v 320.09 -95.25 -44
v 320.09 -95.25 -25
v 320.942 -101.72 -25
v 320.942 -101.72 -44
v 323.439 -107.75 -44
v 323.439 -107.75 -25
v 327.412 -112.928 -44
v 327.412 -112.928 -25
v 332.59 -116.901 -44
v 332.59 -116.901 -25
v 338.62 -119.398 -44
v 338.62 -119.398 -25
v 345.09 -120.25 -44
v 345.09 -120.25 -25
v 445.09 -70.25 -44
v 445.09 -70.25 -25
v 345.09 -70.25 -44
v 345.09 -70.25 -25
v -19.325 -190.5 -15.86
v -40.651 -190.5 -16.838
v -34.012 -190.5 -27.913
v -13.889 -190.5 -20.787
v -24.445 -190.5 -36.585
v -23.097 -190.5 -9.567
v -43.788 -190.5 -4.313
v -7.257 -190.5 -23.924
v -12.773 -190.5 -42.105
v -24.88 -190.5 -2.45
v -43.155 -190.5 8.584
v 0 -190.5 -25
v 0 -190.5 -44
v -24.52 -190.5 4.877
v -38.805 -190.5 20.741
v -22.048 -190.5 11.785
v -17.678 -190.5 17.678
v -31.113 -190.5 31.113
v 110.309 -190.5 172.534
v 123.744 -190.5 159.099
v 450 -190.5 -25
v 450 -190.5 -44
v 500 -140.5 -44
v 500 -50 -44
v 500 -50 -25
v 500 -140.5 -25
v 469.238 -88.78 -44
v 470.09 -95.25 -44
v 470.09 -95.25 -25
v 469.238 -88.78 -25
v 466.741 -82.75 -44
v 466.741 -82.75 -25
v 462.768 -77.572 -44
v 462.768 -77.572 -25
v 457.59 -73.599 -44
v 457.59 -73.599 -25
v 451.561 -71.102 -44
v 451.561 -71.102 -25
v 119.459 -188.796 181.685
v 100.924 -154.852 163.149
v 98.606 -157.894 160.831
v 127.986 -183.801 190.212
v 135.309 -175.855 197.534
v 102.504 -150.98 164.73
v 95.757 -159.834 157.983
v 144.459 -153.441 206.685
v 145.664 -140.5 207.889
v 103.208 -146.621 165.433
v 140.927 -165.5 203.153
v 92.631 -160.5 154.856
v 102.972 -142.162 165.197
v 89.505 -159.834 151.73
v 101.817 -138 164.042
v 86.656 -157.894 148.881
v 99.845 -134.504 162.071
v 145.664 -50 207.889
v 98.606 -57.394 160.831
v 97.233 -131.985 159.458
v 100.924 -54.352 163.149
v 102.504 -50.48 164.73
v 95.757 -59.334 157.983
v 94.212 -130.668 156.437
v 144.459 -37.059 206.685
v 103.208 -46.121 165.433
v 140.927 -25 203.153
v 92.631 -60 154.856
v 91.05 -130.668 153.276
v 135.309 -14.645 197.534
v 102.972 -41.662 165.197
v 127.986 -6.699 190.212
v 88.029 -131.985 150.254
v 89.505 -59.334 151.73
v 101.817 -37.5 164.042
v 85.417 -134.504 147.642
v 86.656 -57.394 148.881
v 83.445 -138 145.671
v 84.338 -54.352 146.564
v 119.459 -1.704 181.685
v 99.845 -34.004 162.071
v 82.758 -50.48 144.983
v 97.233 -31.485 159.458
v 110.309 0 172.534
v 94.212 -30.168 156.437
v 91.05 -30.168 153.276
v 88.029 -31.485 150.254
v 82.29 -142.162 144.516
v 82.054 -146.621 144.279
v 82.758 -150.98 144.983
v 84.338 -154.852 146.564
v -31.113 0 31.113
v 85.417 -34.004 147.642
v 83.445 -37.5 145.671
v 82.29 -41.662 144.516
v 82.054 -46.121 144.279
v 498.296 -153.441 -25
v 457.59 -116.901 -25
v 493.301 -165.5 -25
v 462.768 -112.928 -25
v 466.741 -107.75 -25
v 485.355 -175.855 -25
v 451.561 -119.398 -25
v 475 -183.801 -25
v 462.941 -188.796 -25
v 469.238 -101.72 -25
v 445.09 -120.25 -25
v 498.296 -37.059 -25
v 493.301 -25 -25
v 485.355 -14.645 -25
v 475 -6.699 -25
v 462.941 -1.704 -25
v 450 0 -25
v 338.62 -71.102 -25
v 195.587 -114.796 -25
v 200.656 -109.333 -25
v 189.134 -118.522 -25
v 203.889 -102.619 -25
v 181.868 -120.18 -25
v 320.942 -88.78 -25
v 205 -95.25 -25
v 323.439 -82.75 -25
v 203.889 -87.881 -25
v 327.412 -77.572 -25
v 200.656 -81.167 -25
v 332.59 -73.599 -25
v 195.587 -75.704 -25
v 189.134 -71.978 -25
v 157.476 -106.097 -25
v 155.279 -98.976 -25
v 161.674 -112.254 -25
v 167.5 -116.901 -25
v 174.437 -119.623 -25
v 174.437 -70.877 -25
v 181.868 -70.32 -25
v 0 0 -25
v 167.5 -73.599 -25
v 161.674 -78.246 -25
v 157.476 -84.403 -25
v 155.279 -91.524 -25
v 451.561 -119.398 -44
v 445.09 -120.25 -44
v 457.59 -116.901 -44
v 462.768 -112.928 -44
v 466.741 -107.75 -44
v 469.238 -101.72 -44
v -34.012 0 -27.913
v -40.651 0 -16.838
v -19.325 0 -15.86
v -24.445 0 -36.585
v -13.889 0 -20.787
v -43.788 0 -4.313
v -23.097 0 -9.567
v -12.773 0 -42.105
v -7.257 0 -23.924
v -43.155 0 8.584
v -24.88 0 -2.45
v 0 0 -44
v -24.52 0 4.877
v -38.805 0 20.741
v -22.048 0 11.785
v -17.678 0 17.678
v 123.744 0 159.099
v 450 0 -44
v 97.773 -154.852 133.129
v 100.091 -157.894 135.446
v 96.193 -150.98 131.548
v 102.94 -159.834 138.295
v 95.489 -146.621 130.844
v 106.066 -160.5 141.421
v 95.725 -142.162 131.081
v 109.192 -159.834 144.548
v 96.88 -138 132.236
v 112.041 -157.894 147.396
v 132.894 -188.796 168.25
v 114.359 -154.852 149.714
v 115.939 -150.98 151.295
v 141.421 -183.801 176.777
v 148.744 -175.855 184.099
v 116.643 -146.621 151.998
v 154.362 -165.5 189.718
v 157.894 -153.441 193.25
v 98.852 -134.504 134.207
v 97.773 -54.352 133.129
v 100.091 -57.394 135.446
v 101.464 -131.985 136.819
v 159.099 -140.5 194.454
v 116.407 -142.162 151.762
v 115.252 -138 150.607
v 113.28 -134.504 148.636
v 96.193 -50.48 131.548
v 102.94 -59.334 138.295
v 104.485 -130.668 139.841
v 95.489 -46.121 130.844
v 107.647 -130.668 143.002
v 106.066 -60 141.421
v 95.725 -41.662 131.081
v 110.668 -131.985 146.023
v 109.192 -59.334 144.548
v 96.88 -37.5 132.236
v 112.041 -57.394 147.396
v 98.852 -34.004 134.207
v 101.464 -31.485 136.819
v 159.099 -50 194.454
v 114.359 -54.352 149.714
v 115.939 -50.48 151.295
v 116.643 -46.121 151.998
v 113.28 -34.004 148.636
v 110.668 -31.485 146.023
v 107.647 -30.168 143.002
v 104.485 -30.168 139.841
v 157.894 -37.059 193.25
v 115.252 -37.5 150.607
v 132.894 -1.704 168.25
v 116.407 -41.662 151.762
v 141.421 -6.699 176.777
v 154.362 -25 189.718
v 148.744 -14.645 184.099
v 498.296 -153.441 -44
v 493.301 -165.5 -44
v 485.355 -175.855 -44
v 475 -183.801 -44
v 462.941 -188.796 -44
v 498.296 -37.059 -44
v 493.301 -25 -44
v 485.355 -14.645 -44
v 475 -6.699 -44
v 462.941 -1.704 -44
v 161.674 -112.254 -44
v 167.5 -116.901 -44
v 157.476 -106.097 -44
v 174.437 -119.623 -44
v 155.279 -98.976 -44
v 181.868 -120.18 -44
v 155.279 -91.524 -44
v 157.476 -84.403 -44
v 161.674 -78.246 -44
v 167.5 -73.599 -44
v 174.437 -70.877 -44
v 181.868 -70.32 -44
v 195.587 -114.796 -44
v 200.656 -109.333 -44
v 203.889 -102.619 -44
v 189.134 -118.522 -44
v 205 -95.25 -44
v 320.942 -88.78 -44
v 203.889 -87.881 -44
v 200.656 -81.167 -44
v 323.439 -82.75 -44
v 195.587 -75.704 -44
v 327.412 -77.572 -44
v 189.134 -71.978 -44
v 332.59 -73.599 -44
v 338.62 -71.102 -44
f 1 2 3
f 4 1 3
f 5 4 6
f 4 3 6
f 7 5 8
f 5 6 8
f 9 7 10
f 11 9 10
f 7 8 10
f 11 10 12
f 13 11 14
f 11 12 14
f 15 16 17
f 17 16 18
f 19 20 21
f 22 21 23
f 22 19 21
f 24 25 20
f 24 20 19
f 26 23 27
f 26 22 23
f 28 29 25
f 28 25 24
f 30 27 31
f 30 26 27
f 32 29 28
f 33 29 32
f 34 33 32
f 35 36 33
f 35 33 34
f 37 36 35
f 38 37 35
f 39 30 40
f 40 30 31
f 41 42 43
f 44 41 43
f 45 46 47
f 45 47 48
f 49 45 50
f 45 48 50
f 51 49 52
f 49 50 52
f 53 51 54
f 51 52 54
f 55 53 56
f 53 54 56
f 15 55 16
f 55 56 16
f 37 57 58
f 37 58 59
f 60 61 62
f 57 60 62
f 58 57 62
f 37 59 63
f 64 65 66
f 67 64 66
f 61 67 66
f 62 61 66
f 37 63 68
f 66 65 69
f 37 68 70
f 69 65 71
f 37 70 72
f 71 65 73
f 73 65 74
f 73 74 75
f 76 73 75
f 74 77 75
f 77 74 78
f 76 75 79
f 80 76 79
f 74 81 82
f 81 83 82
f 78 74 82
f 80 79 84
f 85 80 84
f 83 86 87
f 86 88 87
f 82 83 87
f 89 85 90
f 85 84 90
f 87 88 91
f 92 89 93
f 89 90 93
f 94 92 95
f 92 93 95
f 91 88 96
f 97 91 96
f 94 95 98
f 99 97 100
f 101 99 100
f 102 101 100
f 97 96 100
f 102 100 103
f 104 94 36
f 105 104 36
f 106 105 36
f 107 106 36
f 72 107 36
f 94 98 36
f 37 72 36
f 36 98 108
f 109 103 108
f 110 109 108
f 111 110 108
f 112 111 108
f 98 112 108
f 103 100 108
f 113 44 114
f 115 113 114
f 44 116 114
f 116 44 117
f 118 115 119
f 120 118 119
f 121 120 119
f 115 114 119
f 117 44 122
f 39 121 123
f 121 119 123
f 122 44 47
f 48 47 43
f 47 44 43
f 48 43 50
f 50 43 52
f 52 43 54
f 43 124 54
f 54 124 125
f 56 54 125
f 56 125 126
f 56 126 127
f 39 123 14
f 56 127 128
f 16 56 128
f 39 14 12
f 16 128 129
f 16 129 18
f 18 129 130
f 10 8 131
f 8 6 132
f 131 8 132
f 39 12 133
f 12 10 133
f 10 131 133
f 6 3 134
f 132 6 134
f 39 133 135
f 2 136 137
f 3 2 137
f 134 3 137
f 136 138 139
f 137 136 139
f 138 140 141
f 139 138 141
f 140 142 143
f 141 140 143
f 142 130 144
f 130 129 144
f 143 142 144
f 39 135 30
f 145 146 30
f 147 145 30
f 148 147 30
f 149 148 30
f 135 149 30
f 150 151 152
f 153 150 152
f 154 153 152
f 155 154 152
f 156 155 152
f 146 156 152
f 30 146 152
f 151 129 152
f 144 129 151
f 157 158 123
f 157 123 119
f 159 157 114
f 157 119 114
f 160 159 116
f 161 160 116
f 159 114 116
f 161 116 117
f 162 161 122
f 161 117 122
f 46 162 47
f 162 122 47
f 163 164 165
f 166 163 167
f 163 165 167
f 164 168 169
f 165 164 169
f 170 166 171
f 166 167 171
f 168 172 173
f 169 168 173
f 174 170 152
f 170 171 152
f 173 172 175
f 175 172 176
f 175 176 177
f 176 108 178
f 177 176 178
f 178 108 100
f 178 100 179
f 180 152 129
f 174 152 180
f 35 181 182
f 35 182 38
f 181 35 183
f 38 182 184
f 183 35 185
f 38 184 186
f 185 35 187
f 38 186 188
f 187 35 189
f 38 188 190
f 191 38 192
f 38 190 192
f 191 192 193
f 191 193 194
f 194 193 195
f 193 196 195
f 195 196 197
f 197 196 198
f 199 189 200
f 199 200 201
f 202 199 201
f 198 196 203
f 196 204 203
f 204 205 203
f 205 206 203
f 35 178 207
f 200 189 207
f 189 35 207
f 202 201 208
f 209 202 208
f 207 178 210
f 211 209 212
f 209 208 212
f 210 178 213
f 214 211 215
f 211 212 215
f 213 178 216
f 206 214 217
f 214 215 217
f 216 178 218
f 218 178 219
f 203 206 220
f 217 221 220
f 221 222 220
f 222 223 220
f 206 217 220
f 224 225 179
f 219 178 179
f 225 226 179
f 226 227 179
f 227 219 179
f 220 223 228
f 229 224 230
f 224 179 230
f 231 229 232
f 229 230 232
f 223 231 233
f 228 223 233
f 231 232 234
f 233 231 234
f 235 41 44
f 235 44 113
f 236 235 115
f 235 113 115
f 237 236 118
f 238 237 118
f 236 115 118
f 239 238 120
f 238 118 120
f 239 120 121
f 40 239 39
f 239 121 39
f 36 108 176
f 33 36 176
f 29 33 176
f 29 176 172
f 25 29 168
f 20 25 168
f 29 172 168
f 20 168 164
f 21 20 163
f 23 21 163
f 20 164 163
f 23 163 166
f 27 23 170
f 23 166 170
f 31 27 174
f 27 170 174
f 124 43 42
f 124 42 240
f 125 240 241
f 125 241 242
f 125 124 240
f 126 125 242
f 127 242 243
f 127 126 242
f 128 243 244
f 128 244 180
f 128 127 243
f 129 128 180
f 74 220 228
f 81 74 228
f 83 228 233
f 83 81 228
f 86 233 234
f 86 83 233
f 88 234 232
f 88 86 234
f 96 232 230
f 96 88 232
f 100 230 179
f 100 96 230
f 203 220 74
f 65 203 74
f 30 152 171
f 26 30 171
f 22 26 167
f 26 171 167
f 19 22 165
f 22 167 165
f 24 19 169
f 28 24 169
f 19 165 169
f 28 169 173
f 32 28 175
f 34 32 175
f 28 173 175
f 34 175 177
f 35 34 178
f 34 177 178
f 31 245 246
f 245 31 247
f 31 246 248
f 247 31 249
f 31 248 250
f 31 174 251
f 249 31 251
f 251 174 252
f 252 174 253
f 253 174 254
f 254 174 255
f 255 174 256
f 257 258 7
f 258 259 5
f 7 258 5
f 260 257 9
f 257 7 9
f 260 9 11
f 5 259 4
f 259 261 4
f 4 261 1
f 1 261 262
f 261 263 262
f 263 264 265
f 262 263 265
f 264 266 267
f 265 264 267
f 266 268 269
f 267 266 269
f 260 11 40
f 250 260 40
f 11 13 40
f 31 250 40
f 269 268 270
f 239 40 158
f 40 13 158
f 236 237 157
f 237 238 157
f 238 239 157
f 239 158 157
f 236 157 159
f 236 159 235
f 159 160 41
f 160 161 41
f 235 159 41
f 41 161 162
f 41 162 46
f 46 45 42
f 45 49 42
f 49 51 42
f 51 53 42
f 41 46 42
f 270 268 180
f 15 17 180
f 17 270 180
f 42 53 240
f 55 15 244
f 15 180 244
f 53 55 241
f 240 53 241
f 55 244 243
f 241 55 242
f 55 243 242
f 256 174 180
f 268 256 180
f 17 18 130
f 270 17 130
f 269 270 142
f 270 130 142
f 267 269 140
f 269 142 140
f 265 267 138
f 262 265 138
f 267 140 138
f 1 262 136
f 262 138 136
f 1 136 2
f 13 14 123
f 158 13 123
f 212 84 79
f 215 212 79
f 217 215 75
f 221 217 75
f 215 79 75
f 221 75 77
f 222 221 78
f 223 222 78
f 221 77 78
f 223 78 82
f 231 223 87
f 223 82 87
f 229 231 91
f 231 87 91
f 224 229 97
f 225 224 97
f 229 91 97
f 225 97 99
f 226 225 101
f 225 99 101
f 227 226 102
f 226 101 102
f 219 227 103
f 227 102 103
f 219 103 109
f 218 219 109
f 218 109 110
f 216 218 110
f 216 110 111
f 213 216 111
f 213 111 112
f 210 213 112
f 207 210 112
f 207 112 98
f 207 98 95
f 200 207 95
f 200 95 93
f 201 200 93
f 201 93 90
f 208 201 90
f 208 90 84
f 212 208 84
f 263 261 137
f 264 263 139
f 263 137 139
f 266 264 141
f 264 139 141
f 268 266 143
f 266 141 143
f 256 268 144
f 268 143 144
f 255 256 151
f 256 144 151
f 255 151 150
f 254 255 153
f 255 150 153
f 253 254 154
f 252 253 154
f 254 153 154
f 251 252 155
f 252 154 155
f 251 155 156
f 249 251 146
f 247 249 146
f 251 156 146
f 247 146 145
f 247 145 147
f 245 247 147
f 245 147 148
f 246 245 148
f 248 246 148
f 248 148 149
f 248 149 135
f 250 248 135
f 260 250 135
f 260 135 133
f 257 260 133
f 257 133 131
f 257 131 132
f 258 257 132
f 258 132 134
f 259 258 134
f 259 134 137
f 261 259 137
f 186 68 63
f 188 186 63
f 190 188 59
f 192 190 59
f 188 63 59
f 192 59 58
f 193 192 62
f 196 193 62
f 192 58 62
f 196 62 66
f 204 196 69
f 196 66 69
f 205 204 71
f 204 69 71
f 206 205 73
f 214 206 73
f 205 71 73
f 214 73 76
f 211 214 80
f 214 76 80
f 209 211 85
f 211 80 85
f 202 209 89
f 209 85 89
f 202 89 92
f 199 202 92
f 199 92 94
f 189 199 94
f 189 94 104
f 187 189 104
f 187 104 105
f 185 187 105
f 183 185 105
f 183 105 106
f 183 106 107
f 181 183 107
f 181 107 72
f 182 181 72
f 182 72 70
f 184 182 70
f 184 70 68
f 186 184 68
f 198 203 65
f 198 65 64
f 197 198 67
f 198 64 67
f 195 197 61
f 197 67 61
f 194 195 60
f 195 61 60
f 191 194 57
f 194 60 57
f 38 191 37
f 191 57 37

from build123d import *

# Parameters (mm, degrees)
F1_DEPTH = 190.5
F2_R     = 50
F3_R     = 25
F4_DEPTH = 25
F5_DEPTH = 25
F6_R     = 15
F7_DEPTH = 25


# Not quite as in the source:
# - ends of sketch curves that miss each other by under 0.0002 mm in the source are joined


with BuildPart() as f1:
    # F0 (on Front) → F1 (new body)
    with BuildSketch(Plane.XZ):
        with BuildLine():
            Line((145.6639969244, 207.8893936688), (-31.1126983722, 31.1126983722))
            ThreePointArc((-31.1126983722, 31.1126983722), (-40.6506994305, -16.8380710241), (0, -44))
            Line((0, -44), (500, -44))
            Line((500, -44), (500, -25))
            Line((500, -25), (0, -24.9999985185))
            ThreePointArc((0, -24.9999985185), (-23.096986944, -9.5670852422), (-17.6776684821, 17.6776684821))
            Line((-17.6776684821, 17.6776684821), (159.0990268146, 194.4543637787))
            Line((159.0990268146, 194.4543637787), (145.6639969244, 207.8893936688))
        make_face()
    extrude(amount=F1_DEPTH)

    # F2
    f2_edges = [f1.edges().sort_by_distance(p)[0] for p in [
        (500, 0, -34.5),
        (500, -190.5, -34.5),
        (152.381512, -190.5, 201.171879),
        (152.381512, 0, 201.171879),
    ]]
    fillet(f2_edges, radius=F2_R)

    # F3 (on face) → F4 (cut)
    with BuildSketch(Plane.XY.offset(-24.9999985185)):
        with Locations((180, -95.25)):
            Circle(F3_R)
    extrude(amount=-F4_DEPTH, mode=Mode.SUBTRACT)

    # F3 (on face) → F5 (cut)
    with BuildSketch(Plane.XY.offset(-24.9999985185)):
        with BuildLine():
            Line((445.0901150703, -70.25), (345.0901150703, -70.25))
            ThreePointArc((345.0901150703, -70.25), (327.4124455407, -77.5723304703), (320.0901150703, -95.25))
            ThreePointArc((320.0901150703, -95.25), (327.4124455407, -112.9276695297), (345.0901150703, -120.25))
            Line((345.0901150703, -120.25), (445.0901150703, -120.25))
            ThreePointArc((445.0901150703, -120.25), (462.7677846, -112.9276695297), (470.0901150703, -95.25))
            ThreePointArc((470.0901150703, -95.25), (462.7677846, -77.5723304703), (445.0901150703, -70.25))
        make_face()
    extrude(amount=-F5_DEPTH, mode=Mode.SUBTRACT)

    # F6 (on face) → F7 (cut)
    with BuildSketch(Plane(origin=(-31.1126983722, 0, 31.1126983722), x_dir=(0, -1, 0), z_dir=(-0.7071067812, 0, 0.7071067812))):
        with Locations((45, 175)):
            Circle(F6_R)
        with Locations((145.5, 175)):
            Circle(F6_R)
    extrude(amount=-F7_DEPTH, mode=Mode.SUBTRACT)


solid = f1.part
